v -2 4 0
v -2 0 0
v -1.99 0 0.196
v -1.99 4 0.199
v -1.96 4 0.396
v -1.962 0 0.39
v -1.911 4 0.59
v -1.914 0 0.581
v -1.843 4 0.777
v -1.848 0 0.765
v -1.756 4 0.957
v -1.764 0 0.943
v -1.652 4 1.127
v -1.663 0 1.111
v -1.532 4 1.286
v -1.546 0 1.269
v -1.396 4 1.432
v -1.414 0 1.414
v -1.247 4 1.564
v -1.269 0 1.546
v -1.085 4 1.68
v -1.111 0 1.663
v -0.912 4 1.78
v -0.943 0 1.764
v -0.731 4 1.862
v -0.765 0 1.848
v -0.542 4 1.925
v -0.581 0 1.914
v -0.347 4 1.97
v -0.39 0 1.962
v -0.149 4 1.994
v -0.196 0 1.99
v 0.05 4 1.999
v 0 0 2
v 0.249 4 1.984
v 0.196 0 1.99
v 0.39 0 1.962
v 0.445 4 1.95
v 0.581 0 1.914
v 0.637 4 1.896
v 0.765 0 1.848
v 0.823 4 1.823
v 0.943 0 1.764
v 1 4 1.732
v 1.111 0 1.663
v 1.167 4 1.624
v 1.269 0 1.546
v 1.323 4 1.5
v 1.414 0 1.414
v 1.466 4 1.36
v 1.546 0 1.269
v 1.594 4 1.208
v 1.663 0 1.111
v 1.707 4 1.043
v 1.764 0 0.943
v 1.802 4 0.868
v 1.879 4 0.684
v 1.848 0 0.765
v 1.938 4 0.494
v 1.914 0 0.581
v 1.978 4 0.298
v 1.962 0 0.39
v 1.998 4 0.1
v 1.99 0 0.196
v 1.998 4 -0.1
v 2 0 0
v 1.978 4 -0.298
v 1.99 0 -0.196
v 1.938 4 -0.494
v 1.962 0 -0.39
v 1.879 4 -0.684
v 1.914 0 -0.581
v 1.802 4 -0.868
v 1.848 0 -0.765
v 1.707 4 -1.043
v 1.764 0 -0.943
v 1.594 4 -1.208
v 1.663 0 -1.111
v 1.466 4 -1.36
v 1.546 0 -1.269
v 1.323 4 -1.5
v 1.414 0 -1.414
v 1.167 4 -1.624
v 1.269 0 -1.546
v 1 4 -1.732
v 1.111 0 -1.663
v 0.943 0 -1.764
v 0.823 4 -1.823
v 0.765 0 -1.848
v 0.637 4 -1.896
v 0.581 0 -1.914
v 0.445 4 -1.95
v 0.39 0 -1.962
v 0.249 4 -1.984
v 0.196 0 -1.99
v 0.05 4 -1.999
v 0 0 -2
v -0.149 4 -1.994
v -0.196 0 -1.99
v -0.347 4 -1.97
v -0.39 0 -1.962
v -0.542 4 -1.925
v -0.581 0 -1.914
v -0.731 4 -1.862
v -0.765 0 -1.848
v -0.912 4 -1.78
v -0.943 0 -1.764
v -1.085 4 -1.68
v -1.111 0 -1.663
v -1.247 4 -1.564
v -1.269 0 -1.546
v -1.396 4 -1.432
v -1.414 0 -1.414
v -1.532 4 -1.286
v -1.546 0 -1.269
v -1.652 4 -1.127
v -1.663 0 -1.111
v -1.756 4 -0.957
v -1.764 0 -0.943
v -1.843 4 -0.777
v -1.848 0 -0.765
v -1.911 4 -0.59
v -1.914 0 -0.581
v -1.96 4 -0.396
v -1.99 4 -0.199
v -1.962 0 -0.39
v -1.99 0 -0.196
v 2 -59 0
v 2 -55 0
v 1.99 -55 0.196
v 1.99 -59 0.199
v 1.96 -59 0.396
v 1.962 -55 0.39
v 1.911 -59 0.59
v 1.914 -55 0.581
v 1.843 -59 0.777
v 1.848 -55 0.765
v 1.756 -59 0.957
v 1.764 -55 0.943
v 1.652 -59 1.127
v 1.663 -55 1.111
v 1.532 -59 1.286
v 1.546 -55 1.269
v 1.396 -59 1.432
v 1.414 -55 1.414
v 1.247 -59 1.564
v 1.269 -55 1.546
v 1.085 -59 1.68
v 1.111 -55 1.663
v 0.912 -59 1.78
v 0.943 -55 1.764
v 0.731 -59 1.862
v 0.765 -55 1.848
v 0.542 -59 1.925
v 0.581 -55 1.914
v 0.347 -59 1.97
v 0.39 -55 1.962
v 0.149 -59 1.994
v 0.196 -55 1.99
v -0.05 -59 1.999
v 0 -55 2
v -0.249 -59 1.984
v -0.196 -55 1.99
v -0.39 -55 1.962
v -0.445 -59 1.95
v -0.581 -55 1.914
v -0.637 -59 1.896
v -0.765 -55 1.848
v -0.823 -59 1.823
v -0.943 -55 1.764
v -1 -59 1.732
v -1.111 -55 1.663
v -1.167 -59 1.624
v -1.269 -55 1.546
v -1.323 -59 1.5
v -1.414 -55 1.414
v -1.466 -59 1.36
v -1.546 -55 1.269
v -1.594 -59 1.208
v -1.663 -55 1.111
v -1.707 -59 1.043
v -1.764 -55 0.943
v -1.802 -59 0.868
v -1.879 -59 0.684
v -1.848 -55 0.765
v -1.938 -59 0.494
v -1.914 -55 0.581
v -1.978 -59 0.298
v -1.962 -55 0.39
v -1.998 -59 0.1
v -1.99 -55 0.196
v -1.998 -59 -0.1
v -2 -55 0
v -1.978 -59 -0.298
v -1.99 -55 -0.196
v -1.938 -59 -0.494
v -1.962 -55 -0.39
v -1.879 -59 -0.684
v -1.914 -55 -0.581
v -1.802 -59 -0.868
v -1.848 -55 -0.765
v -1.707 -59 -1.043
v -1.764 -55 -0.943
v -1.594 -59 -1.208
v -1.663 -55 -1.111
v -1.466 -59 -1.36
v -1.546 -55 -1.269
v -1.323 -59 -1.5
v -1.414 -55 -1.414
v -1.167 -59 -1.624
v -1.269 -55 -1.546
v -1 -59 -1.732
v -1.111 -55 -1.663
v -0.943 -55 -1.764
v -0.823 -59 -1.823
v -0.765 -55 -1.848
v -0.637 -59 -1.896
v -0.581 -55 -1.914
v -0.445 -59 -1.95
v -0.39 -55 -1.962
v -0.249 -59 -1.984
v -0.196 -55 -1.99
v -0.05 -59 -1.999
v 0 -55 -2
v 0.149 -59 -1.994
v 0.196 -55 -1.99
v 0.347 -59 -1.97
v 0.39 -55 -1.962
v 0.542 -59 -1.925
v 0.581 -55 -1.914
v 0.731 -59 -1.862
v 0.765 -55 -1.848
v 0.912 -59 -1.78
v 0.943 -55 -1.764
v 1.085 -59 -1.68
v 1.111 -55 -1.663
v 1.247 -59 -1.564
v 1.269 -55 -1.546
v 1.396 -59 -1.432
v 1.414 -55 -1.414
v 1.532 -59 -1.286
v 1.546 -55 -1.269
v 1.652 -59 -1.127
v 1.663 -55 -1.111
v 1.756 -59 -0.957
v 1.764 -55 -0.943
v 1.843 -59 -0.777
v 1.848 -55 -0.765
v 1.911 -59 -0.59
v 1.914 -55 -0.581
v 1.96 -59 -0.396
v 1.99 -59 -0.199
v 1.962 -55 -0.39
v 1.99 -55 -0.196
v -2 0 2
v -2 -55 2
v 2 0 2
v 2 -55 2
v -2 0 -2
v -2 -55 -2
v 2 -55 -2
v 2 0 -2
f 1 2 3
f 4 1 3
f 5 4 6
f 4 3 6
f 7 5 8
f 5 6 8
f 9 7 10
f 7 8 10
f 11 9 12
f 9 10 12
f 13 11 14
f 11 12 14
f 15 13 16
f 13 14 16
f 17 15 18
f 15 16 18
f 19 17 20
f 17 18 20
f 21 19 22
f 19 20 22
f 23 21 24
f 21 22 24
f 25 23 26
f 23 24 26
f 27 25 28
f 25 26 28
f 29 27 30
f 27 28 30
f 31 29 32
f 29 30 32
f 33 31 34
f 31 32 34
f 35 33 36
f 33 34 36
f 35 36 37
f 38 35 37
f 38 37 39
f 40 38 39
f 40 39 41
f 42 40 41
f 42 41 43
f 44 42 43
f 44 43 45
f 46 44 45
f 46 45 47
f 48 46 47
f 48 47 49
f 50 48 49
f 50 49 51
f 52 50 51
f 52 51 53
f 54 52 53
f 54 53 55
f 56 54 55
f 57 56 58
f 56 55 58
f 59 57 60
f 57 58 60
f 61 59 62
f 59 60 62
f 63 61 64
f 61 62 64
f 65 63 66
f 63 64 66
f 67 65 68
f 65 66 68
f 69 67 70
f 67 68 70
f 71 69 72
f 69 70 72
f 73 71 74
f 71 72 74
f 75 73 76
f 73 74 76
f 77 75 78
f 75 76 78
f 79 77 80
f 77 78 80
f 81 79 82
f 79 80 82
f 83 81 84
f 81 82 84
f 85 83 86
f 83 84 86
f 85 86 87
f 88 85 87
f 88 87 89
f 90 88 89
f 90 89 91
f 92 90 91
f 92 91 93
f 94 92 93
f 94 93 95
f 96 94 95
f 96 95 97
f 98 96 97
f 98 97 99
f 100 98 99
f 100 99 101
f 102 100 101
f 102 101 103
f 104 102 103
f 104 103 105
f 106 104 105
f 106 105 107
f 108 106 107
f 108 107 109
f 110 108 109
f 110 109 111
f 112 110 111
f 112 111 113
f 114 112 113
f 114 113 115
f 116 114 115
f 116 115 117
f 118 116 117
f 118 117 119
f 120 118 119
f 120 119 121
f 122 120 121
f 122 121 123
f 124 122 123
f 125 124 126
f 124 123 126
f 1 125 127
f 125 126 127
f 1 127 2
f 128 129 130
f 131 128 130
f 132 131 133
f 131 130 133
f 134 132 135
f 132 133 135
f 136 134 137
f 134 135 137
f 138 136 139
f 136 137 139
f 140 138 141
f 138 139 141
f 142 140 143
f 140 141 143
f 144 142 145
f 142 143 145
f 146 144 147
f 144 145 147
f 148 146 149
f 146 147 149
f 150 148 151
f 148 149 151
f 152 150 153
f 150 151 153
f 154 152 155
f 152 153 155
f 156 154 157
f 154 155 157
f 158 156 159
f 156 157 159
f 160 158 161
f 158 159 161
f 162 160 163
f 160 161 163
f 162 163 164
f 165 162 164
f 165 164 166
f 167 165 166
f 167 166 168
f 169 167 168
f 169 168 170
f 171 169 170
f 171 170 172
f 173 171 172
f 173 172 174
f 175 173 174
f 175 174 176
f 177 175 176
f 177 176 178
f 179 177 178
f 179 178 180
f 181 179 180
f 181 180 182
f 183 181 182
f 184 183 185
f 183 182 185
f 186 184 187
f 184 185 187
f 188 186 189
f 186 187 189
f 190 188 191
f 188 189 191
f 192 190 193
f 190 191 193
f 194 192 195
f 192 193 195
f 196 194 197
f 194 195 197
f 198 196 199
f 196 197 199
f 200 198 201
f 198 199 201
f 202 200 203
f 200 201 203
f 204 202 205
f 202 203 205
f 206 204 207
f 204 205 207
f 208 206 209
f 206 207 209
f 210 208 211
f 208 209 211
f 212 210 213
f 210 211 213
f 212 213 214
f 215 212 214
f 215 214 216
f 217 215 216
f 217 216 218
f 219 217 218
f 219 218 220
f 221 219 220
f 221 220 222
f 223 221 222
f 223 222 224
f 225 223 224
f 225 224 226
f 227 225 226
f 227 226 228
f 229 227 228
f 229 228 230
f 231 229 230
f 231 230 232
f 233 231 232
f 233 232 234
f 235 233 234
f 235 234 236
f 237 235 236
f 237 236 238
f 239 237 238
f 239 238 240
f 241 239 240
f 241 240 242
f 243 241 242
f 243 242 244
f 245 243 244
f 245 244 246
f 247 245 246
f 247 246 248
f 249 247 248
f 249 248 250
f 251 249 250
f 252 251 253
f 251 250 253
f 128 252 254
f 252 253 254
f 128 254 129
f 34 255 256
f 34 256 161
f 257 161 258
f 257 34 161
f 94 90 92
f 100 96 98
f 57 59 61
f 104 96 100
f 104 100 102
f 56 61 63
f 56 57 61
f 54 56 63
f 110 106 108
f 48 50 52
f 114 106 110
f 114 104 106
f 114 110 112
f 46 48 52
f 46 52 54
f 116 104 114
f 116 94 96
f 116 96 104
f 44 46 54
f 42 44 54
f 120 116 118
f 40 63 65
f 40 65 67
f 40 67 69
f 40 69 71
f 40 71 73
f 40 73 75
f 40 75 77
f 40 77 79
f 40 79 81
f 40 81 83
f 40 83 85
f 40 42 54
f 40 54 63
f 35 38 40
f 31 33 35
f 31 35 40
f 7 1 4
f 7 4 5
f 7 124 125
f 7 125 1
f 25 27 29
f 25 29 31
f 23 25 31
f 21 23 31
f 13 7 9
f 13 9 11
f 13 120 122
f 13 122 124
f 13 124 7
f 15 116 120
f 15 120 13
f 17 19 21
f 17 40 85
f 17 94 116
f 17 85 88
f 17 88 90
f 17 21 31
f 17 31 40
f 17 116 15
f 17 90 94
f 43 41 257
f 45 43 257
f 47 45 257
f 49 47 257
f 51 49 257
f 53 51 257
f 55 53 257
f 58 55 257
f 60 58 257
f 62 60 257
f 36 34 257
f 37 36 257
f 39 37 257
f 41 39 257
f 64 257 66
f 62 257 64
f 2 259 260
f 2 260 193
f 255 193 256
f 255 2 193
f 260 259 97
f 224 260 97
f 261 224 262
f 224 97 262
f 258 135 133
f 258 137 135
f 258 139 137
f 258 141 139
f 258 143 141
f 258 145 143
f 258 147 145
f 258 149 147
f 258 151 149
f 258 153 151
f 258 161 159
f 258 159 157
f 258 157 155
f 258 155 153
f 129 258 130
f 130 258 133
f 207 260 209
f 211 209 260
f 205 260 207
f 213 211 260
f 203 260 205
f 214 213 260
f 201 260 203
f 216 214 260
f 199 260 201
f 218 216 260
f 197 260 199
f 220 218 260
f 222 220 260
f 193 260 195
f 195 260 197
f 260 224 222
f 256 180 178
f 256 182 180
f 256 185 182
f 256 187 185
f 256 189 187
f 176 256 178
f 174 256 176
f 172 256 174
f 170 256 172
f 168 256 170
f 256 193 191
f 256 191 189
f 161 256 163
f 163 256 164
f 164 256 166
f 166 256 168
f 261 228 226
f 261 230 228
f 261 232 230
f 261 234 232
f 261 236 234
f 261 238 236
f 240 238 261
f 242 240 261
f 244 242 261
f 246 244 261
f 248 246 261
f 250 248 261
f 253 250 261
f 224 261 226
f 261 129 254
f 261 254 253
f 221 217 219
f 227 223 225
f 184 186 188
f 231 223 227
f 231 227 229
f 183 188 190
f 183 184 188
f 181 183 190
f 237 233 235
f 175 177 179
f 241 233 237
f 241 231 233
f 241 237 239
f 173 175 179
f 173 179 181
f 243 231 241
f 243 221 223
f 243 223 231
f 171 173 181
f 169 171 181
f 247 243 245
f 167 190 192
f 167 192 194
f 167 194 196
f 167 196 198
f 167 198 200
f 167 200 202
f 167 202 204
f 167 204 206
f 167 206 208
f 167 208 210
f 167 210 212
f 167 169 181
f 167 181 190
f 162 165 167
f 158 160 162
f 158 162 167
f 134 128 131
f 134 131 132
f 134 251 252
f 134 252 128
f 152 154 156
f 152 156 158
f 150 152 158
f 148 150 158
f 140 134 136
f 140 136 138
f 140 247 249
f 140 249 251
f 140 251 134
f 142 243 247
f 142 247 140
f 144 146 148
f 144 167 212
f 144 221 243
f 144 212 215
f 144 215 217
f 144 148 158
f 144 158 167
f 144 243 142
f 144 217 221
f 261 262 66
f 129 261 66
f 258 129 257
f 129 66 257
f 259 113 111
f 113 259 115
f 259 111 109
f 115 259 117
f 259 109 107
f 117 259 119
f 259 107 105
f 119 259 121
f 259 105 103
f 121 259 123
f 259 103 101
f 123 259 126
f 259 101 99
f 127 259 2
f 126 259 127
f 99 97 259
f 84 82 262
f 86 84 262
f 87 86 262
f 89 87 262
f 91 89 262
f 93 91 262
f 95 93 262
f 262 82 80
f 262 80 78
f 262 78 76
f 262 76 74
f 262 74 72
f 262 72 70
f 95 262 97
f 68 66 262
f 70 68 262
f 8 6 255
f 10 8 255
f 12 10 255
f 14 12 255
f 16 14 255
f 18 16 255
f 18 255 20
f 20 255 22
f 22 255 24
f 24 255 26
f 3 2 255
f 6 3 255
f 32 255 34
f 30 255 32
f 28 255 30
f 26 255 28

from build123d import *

# Parameters (mm, degrees)
F0_W     = 4
F0_H     = 4
F1_DEPTH = 55
F2_R     = 2
F3_DEPTH = 4
F4_R     = 2
F5_DEPTH = 4


with BuildPart() as f1:
    # F0 (on Front) → F1 (new body)
    with BuildSketch(Plane.XZ):
        Rectangle(F0_W, F0_H)
    extrude(amount=F1_DEPTH)

    # F2 (on face) → F3 (join)
    with BuildSketch(Plane(origin=(0, 0, 0), x_dir=(-1, 0, 0), z_dir=(0, 1, 0))):
        Circle(F2_R)
    extrude(amount=F3_DEPTH)

    # F4 (on face) → F5 (join)
    with BuildSketch(Plane.XZ.offset(55)):
        Circle(F4_R)
    extrude(amount=F5_DEPTH)


solid = f1.part
